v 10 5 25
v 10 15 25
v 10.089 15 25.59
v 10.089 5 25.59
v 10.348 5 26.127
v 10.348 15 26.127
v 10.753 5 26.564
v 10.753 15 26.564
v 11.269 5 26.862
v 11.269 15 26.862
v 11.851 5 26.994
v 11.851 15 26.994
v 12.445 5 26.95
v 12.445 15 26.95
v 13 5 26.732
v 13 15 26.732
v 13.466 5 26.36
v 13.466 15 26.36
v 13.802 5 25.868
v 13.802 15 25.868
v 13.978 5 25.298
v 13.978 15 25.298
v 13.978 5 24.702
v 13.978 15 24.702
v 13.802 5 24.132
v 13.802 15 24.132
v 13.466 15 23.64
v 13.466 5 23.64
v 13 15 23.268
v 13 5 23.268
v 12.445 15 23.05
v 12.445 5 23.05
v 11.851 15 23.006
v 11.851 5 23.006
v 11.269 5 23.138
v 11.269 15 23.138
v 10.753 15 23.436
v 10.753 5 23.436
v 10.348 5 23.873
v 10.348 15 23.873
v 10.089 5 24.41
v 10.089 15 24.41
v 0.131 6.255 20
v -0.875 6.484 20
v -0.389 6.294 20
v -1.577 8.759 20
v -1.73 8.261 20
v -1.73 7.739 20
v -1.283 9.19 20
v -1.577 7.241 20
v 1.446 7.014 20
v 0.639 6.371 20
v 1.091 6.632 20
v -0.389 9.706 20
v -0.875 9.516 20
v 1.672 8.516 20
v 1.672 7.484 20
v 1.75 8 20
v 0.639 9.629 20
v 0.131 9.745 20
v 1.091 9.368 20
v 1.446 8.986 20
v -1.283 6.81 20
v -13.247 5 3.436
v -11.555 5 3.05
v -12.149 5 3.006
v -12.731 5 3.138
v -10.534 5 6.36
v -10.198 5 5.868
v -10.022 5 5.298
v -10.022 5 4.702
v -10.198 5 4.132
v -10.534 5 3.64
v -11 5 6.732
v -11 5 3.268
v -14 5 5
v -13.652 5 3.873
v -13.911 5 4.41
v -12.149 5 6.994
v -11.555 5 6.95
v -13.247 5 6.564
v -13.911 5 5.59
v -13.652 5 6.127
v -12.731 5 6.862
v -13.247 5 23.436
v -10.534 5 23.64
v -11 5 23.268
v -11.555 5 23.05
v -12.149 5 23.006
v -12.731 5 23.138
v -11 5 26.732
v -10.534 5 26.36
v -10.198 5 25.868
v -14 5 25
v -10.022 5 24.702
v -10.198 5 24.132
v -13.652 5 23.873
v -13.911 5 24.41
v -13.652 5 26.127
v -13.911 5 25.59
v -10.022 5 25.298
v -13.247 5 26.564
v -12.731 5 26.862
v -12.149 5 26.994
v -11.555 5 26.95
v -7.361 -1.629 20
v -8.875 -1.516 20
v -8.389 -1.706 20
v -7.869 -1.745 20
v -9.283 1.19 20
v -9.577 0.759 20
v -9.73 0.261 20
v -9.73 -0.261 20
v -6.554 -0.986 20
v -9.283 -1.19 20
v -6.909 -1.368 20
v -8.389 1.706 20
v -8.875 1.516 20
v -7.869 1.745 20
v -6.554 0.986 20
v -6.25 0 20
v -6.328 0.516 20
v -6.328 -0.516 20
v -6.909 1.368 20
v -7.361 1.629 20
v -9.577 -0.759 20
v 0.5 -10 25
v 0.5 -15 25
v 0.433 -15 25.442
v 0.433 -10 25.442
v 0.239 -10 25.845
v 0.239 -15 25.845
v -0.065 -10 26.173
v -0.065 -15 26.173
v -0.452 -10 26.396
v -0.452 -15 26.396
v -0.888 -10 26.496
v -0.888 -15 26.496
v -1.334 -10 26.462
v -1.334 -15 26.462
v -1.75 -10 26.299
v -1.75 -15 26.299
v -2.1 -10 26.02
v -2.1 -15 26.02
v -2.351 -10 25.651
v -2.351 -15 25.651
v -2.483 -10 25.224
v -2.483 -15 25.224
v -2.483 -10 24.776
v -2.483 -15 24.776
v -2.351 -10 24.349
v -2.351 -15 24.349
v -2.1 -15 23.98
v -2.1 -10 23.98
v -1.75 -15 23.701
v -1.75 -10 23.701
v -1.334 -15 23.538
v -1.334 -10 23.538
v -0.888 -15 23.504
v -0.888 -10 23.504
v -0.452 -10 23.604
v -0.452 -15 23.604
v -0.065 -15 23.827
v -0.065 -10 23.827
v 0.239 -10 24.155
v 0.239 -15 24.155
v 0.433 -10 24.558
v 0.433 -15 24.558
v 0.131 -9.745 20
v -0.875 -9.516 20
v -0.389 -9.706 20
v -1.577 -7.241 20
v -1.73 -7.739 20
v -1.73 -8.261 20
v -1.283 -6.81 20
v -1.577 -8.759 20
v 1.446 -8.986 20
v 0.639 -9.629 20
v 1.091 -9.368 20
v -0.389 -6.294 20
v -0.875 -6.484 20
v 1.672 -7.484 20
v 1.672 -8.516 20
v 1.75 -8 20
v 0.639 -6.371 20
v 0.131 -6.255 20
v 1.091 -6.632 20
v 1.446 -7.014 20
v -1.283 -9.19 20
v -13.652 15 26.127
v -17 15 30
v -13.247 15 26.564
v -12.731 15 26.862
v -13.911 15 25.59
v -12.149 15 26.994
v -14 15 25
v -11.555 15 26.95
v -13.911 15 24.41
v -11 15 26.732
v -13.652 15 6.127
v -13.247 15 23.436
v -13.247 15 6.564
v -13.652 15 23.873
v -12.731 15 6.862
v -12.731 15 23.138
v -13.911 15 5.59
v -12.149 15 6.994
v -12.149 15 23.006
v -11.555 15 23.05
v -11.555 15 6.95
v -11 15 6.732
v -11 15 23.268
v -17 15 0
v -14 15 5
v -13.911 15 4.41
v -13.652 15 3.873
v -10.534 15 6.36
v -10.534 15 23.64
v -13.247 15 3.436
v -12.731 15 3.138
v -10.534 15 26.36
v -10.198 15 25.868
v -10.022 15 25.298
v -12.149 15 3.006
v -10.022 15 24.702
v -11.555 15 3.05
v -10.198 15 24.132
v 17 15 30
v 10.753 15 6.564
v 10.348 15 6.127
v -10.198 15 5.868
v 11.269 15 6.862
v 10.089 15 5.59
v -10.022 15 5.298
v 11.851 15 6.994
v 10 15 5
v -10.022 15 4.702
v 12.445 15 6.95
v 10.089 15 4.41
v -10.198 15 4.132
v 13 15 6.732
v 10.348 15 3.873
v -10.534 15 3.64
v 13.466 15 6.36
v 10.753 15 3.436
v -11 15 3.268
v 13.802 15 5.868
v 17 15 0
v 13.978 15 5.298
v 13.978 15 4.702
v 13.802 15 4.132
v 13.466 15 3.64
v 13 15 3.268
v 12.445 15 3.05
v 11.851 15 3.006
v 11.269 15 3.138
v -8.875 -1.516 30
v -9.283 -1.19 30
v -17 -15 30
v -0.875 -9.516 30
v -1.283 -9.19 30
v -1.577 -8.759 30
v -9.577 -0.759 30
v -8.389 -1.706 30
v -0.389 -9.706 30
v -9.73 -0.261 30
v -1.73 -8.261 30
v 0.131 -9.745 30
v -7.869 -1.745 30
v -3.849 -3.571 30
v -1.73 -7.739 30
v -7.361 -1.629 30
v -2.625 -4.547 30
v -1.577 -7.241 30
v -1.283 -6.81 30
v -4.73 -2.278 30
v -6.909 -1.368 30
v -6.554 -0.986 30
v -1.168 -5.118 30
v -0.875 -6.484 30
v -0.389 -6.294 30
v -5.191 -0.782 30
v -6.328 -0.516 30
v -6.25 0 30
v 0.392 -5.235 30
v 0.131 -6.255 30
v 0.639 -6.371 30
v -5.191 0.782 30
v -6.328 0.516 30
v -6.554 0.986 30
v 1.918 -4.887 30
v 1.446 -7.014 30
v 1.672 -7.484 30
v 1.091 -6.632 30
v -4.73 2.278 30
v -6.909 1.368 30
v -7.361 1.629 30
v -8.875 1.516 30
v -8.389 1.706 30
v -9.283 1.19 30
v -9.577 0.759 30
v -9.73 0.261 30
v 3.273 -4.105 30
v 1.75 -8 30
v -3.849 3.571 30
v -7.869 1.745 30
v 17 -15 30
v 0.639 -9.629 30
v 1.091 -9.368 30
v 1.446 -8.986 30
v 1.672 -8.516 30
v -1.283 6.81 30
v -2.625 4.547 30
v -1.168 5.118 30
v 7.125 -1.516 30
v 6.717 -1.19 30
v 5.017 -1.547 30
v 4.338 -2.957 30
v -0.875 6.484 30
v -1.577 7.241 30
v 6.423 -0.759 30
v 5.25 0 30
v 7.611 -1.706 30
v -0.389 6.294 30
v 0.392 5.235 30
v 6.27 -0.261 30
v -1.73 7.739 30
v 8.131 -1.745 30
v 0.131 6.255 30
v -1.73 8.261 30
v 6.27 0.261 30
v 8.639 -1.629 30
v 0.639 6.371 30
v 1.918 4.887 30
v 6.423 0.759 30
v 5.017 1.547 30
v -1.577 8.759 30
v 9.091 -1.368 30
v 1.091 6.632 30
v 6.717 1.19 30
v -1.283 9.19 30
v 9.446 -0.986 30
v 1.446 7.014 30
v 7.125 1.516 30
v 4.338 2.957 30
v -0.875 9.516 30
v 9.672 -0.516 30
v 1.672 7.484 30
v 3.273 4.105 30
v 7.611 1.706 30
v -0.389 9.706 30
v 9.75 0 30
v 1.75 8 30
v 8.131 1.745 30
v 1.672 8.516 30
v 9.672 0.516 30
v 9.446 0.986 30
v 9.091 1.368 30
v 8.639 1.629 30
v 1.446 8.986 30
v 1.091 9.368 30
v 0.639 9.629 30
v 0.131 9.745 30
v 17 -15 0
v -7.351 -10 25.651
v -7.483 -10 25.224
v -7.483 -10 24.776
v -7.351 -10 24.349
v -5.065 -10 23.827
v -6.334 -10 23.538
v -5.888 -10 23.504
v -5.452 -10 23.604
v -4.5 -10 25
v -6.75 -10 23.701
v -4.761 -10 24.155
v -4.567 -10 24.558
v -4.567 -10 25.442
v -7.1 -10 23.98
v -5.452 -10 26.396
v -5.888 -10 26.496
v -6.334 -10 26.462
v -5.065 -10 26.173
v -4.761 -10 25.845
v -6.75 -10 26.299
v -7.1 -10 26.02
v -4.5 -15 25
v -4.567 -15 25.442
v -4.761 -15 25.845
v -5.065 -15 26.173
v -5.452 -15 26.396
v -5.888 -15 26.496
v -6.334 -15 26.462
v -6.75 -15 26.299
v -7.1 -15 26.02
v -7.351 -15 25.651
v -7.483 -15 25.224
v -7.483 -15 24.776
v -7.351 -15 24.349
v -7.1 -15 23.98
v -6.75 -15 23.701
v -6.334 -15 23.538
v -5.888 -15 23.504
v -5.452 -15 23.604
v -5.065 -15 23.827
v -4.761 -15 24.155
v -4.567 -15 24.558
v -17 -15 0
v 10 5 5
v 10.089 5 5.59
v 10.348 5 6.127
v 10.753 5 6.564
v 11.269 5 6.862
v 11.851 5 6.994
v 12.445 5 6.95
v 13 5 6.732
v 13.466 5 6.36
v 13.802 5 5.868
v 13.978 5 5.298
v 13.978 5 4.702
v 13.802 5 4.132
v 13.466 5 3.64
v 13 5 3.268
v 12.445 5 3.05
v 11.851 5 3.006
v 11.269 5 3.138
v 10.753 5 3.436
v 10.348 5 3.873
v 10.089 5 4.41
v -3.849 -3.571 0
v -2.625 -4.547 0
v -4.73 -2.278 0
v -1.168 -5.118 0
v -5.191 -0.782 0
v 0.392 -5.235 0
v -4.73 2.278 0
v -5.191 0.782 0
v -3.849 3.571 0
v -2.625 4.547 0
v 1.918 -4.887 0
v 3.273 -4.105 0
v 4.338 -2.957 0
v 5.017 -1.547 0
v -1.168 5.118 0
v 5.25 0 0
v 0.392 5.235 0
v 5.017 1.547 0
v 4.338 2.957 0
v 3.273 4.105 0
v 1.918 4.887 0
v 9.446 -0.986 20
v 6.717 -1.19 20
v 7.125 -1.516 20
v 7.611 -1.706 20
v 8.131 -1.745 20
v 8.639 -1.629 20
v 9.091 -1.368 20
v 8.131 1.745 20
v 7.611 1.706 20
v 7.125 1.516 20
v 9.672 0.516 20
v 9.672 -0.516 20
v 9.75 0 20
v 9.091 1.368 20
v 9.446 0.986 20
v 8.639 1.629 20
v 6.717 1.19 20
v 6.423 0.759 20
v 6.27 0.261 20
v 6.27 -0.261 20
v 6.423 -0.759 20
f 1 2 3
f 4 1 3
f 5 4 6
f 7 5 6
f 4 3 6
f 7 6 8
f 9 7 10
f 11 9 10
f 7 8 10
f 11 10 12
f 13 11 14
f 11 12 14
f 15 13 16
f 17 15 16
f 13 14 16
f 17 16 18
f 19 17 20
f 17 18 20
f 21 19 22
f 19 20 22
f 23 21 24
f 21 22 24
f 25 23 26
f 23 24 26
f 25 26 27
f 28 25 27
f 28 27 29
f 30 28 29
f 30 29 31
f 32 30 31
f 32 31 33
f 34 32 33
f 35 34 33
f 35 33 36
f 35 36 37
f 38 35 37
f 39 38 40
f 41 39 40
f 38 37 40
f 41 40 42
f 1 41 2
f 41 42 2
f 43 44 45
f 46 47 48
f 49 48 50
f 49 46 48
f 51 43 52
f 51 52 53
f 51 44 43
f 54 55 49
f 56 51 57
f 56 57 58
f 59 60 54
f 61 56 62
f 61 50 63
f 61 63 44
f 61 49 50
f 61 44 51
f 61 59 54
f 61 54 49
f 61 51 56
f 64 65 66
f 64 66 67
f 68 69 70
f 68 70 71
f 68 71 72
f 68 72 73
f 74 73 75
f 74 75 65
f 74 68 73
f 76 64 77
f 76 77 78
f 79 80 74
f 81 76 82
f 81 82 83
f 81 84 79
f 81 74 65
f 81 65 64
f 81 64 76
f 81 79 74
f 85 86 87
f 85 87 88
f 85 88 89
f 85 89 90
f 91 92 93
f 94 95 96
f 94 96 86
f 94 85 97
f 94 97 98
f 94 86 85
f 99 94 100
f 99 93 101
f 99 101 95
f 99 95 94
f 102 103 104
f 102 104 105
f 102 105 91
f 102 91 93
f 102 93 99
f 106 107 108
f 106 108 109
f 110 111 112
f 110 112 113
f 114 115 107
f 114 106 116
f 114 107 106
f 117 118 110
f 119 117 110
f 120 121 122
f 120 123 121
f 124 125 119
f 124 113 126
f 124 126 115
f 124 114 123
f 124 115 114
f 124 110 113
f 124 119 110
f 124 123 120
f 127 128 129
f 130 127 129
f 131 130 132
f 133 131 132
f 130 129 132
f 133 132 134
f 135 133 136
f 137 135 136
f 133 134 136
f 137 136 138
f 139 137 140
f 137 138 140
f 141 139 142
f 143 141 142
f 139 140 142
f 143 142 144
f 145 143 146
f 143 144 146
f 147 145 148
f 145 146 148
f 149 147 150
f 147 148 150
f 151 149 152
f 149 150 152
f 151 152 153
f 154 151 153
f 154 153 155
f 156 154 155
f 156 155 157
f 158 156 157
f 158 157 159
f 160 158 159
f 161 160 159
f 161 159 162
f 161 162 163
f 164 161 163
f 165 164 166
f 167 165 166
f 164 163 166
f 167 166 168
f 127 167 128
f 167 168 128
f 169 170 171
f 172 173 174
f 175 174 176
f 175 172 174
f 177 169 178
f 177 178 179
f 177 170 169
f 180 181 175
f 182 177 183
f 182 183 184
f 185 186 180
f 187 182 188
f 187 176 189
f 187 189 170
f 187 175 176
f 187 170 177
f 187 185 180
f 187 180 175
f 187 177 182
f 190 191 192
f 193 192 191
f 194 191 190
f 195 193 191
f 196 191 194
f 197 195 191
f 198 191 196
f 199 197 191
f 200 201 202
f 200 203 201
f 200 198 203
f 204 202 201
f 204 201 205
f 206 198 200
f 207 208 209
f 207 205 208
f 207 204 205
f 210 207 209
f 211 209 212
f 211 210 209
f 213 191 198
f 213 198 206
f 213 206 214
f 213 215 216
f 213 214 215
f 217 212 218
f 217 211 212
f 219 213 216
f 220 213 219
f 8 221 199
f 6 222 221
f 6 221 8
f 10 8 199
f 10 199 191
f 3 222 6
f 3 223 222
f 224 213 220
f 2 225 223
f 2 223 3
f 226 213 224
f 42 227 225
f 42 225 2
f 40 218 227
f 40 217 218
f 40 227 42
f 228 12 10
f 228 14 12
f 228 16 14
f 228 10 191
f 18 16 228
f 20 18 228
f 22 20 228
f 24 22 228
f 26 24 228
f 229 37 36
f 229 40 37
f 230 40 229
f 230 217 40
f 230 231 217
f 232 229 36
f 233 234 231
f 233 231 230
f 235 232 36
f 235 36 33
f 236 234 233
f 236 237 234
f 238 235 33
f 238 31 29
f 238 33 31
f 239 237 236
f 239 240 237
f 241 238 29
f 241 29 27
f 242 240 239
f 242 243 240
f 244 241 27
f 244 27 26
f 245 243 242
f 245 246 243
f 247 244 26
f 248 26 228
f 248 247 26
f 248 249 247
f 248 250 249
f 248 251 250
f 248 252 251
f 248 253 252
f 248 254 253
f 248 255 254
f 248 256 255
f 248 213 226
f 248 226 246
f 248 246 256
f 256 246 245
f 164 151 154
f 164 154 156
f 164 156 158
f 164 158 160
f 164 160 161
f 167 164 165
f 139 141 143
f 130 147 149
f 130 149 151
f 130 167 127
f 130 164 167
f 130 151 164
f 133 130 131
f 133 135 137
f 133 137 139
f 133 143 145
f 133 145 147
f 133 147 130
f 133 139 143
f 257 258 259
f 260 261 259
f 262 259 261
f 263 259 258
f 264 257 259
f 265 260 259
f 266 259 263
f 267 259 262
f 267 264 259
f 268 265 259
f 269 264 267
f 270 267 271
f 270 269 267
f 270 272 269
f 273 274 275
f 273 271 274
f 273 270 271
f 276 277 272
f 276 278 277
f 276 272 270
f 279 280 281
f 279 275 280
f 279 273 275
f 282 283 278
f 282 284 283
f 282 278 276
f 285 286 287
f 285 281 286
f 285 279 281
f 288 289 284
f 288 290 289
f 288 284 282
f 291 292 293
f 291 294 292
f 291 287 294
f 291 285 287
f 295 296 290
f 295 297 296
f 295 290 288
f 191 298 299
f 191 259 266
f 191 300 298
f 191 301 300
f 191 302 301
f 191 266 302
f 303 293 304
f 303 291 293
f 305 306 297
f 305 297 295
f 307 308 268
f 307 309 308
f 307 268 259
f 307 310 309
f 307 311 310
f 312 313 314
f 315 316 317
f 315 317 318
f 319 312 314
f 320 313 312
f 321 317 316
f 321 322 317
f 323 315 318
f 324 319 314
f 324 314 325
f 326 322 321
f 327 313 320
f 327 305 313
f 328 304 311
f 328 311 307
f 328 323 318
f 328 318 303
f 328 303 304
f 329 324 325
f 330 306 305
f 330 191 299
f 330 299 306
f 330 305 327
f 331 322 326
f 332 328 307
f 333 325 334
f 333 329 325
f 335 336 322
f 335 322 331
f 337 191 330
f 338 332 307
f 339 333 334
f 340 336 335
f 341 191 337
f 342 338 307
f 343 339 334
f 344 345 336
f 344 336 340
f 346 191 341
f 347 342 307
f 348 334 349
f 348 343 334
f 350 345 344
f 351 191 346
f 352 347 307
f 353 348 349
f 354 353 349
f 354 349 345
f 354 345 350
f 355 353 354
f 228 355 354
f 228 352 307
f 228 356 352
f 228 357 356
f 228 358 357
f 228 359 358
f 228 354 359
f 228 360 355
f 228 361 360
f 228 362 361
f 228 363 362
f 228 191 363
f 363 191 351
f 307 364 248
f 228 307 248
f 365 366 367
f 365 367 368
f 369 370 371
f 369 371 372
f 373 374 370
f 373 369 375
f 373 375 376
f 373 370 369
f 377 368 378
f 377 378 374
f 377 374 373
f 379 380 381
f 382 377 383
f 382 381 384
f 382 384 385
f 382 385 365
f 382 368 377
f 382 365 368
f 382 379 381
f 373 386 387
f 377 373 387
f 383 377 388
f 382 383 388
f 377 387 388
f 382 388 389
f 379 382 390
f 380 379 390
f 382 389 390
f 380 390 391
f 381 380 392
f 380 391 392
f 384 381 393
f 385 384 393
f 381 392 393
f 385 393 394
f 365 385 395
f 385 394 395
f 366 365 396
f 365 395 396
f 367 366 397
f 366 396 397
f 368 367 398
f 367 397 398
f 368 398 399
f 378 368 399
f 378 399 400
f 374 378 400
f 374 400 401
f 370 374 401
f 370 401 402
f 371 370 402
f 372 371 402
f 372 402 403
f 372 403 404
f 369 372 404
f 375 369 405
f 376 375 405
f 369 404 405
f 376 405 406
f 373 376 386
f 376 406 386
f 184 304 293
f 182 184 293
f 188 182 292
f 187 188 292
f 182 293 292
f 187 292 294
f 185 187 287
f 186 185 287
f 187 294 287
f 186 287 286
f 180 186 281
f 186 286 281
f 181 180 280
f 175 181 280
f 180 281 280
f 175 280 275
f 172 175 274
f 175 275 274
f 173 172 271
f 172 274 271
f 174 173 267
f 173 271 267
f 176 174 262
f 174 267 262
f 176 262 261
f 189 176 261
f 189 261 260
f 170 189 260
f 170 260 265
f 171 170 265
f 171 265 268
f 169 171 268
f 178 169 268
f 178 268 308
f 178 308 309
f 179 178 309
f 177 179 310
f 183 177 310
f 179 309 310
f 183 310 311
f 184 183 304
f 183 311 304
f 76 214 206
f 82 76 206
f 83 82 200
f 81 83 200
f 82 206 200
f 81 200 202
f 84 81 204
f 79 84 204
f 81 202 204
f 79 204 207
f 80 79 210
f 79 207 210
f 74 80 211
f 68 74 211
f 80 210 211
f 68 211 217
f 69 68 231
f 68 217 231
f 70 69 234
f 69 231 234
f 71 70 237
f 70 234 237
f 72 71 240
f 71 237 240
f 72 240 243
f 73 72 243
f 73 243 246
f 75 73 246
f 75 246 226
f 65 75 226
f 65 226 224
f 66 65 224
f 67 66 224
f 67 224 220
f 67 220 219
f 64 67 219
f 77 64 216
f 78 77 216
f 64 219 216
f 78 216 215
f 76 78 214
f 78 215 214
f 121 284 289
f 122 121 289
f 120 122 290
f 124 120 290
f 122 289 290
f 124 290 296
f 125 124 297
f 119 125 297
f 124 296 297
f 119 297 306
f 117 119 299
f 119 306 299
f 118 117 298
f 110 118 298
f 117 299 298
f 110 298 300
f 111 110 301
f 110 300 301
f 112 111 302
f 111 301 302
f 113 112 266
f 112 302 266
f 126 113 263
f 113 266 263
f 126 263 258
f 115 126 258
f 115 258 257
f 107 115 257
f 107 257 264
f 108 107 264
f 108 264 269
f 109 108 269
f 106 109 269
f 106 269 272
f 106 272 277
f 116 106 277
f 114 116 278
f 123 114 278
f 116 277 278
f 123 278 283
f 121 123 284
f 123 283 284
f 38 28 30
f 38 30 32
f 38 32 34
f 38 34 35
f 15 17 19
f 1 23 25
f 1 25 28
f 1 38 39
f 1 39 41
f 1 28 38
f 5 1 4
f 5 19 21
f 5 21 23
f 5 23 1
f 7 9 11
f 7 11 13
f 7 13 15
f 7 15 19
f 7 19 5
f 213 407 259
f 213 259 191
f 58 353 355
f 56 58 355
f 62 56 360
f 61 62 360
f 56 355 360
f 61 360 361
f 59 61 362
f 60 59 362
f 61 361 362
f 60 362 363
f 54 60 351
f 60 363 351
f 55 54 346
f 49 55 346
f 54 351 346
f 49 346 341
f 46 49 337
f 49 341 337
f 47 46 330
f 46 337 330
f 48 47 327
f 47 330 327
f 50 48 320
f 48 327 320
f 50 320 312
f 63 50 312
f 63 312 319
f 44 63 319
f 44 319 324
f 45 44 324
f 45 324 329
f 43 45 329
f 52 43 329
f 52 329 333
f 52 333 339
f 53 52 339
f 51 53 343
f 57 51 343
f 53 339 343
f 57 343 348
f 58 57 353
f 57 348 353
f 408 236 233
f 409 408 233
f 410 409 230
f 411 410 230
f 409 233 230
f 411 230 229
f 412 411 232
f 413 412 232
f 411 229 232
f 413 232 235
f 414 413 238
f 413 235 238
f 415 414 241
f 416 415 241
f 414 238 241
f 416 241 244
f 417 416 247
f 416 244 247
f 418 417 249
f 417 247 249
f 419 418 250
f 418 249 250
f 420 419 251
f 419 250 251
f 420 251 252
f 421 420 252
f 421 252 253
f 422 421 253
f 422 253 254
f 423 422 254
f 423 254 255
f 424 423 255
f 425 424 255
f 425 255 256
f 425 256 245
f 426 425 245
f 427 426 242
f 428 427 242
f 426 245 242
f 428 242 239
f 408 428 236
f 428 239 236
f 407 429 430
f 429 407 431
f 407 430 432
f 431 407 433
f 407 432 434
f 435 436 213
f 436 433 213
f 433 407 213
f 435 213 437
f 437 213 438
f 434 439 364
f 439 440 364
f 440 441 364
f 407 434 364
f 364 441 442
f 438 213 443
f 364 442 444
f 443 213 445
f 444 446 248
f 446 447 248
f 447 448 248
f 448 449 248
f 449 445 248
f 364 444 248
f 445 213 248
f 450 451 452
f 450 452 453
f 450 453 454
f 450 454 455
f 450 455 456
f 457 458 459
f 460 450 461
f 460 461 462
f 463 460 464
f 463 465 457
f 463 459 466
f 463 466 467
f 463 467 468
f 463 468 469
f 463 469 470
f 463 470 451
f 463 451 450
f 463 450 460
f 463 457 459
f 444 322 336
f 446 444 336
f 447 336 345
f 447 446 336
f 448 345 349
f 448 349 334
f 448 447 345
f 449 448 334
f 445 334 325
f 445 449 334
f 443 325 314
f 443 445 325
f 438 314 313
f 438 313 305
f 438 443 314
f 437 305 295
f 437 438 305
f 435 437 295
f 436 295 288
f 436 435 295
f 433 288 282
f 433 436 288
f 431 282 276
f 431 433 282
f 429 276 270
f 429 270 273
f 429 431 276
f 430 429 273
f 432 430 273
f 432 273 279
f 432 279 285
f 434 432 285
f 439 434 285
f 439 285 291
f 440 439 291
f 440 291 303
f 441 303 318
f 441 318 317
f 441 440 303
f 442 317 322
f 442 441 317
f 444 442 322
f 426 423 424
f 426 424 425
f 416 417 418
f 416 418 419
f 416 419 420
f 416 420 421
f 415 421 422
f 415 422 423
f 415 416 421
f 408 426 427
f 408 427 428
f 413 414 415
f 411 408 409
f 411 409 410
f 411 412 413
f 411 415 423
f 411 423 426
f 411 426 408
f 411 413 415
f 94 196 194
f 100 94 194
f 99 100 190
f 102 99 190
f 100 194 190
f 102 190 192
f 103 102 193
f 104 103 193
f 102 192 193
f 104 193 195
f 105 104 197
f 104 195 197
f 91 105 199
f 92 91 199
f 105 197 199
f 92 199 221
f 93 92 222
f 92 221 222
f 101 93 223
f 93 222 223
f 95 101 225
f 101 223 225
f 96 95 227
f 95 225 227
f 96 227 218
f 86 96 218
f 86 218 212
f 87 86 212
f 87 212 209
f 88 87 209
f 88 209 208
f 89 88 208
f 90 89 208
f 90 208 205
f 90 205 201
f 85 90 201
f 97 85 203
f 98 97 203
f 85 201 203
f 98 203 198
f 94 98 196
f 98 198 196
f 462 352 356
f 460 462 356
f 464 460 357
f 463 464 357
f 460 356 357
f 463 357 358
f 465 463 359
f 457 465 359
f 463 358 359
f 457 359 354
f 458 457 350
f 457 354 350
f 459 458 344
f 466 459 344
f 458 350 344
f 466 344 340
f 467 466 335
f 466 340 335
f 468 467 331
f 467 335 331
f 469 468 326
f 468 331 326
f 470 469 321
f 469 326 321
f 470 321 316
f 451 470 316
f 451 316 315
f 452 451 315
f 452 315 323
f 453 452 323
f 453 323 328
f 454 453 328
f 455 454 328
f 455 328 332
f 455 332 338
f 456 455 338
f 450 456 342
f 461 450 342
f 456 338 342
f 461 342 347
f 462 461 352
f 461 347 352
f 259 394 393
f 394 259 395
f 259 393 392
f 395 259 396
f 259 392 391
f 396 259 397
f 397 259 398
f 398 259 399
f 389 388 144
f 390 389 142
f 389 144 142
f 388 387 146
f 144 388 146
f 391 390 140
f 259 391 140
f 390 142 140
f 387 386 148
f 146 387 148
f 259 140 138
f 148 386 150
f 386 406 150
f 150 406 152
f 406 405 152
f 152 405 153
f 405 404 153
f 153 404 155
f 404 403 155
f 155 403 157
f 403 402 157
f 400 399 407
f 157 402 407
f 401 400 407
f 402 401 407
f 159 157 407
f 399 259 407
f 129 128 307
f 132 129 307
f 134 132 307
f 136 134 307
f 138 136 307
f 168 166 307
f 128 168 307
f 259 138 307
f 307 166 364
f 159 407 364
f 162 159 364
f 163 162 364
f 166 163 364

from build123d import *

# Parameters (mm, degrees)
SKETCH_1_W          = 34
SKETCH_1_H          = 30
SKETCH_1_R          = 5.25
EXTRUDE_1_DEPTH     = 30
SKETCH_2_R          = 1.75
CUT_EXTRUDE_1_DEPTH = 10
SKETCH_4_R          = 2
CUT_EXTRUDE_3_DEPTH = 10
SKETCH_5_R          = 1.5
CUT_EXTRUDE_4_DEPTH = 5


with BuildPart() as part:
    # 草图1 → 凸台-拉伸1 (new body)
    with BuildSketch(Plane.XY):
        Rectangle(SKETCH_1_W, SKETCH_1_H)
        Circle(SKETCH_1_R, mode=Mode.SUBTRACT)
    extrude(amount=EXTRUDE_1_DEPTH)

    # 草图2 → 切除-拉伸1 (cut)
    with BuildSketch(Plane.XY.offset(30)):
        with Locations((-8, 0)):
            Circle(SKETCH_2_R)
        with Locations((0, 8)):
            Circle(SKETCH_2_R)
        with Locations((8, 0)):
            Circle(SKETCH_2_R)
        with Locations((0, -8)):
            Circle(SKETCH_2_R)
    extrude(amount=-CUT_EXTRUDE_1_DEPTH, mode=Mode.SUBTRACT)

    # 草图4 → 切除-拉伸3 (cut)
    with BuildSketch(Plane(origin=(0, 15, 0), x_dir=(1, 0, 0), z_dir=(0, 1, 0))):
        with Locations(Location((12, -25, 0), (0, 0, 180))):
            Circle(SKETCH_4_R)
        with Locations(Location((-12, -25, 0), (0, 0, 180))):
            Circle(SKETCH_4_R)
        with Locations(Location((-12, -5, 0), (0, 0, 180))):
            Circle(SKETCH_4_R)
        with Locations(Location((12, -5, 0), (0, 0, 180))):
            Circle(SKETCH_4_R)
    extrude(amount=-CUT_EXTRUDE_3_DEPTH, mode=Mode.SUBTRACT)

    # 草图5 → 切除-拉伸4 (cut)
    with BuildSketch(Plane(origin=(0, -15, 0), x_dir=(-1, 0, 0), z_dir=(0, -1, 0))):
        with Locations(Location((1, -25, 0), (0, 0, 180))):
            Circle(SKETCH_5_R)
        with Locations(Location((6, -25, 0), (0, 0, 180))):
            Circle(SKETCH_5_R)
    extrude(amount=-CUT_EXTRUDE_4_DEPTH, mode=Mode.SUBTRACT)


solid = part.part
